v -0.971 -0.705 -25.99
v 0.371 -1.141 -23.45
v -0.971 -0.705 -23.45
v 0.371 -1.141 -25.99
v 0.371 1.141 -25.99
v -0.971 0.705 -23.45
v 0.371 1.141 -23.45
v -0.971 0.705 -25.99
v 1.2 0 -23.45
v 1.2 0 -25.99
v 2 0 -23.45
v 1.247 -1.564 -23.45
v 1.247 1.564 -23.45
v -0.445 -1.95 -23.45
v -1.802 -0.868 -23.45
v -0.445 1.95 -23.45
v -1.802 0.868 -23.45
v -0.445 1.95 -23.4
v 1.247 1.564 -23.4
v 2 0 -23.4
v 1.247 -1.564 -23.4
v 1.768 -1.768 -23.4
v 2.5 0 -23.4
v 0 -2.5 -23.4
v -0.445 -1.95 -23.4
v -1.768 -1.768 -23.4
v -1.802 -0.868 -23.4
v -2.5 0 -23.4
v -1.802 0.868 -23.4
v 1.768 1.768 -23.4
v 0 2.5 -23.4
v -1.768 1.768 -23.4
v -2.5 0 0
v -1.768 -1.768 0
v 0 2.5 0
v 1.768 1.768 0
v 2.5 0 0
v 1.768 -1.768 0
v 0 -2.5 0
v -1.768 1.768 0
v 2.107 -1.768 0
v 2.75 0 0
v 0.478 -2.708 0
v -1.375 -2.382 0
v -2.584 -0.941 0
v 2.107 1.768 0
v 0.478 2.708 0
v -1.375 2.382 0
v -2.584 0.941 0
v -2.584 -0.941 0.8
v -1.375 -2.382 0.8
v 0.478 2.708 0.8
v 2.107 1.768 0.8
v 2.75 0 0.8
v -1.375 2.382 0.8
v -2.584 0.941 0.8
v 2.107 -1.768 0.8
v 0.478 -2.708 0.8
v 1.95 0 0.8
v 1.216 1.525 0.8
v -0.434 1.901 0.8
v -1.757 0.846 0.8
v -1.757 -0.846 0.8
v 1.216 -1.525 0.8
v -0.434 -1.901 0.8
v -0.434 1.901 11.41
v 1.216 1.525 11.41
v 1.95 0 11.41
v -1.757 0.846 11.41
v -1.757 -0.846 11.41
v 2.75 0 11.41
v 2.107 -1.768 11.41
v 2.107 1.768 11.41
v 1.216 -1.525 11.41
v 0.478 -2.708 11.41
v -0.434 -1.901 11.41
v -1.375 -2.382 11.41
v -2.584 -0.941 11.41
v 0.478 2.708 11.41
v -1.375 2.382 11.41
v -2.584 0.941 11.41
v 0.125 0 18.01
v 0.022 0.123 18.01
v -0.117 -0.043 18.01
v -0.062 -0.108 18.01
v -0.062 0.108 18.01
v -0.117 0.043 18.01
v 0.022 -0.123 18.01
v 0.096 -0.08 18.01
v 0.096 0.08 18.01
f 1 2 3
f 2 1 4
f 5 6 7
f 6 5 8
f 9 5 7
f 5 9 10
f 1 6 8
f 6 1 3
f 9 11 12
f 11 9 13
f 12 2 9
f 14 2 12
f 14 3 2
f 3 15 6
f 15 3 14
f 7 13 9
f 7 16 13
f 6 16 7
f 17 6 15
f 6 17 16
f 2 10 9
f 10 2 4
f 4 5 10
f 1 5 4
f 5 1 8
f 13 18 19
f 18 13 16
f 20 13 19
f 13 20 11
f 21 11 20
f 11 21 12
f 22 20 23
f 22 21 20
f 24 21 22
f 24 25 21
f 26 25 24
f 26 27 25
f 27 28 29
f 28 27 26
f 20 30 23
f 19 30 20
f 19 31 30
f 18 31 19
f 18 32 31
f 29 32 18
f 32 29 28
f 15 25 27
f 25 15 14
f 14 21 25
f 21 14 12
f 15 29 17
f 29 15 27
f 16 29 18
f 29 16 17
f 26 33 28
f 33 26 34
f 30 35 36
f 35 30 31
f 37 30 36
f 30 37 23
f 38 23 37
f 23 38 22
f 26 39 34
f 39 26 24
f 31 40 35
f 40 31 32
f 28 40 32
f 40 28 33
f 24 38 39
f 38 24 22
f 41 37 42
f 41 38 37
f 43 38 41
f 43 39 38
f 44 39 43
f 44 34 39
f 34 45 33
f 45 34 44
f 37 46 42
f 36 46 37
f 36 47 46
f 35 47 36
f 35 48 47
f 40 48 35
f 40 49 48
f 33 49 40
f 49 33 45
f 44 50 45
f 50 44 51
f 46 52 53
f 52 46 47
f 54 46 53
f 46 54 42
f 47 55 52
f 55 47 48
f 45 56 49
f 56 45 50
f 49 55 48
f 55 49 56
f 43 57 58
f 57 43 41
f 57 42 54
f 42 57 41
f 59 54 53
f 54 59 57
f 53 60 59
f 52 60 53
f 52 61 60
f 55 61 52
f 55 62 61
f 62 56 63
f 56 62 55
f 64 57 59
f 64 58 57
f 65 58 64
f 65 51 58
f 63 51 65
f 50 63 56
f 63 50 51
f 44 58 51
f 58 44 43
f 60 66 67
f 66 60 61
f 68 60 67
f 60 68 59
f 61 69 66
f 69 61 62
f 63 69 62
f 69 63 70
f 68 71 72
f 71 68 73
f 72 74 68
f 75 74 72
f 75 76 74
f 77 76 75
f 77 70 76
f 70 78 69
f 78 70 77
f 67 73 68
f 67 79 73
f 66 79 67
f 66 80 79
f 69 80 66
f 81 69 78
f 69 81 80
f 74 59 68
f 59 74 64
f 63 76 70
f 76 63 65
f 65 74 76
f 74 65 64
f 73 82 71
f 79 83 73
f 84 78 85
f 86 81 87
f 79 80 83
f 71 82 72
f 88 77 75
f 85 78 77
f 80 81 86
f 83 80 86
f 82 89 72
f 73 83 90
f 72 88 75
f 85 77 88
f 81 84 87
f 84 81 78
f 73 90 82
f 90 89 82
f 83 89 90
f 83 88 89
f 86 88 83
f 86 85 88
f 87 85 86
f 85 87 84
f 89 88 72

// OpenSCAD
// file: GP-xL.scad
/* [Options] */
body_lip_diameter = 5.5;
body_diameter = 5;
lower_shaft_diameter = 2.4;
head_diameter = 5.5;
head_length = 6.6;
upper_shaft_diameter = 3.9;
total_length = 44;
body_lip_height = 0.8;
body_length = 23.4;
compression = 0;
retaining_disk_location_from_bottom = 2.54;
retaining_disk_height = 0.05;
retaining_disk_diameter = 4;
head_tip_diameter = 0.25;

module make_GP_xL(body_lip_diameter = body_lip_diameter,
body_diameter = body_diameter,
lower_shaft_diameter = lower_shaft_diameter,
head_diameter = head_diameter,
head_length = head_length,
upper_shaft_diameter = upper_shaft_diameter,
total_length = total_length,
body_lip_height = body_lip_height,
body_length = body_length,
compression = compression,
retaining_disk_location_from_bottom = retaining_disk_location_from_bottom,
retaining_disk_height = retaining_disk_height,
retaining_disk_diameter = retaining_disk_diameter,
head_tip_diameter = head_tip_diameter) {
    /*
    Bottom Shaft
    Retaining Ring
    Continuing Bottom Shaft
    Body
    Body Lip
    Upper Shaft
    Cone
    Compression
    */
    bottom_shaft_length = compression;
    upper_shaft_length = total_length-(retaining_disk_location_from_bottom+retaining_disk_height+bottom_shaft_length+body_length+body_lip_height+head_length);
    
    alignment_position = retaining_disk_location_from_bottom+retaining_disk_height+bottom_shaft_length+body_length;
    translate([0, 0, -alignment_position]) {
    translate([0,0,retaining_disk_location_from_bottom/2])cylinder(d=lower_shaft_diameter, h=retaining_disk_location_from_bottom, center=true);

    translate([0,0,retaining_disk_location_from_bottom])cylinder(d=retaining_disk_diameter, h=retaining_disk_height, center=false);

    translate([0,0,retaining_disk_location_from_bottom+retaining_disk_height])cylinder(d=lower_shaft_diameter, h=bottom_shaft_length);
    
    let(z=retaining_disk_location_from_bottom+retaining_disk_height+bottom_shaft_length) {
        translate([0,0,z])cylinder(d=body_diameter, h=body_length);
    };
    
    
    let(z=retaining_disk_location_from_bottom+retaining_disk_height+bottom_shaft_length+body_length) {
        translate([0,0,z])cylinder(d=body_lip_diameter, h=body_lip_height);
    };
    
    let(z=retaining_disk_location_from_bottom+retaining_disk_height+bottom_shaft_length+body_length+body_lip_height) {
        translate([0,0,z])cylinder(d=upper_shaft_diameter, h=upper_shaft_length);
    };
    
    let(z=retaining_disk_location_from_bottom+retaining_disk_height+bottom_shaft_length+body_length+body_lip_height+upper_shaft_length) {
        translate([0,0,z])cylinder(d1=head_diameter, d2=head_tip_diameter, h=head_length);
    };
};
}


make_GP_xL();
// main file
/* [Options] */
body_lip_diameter = 5.5;
body_diameter = 5;
lower_shaft_diameter = 2.4;
head_diameter = 5.5;
head_length = 6.6;
upper_shaft_diameter = 3.9;
total_length = 44;
body_lip_height = 0.8;
body_length = 23.4;
compression = 0;
retaining_disk_location_from_bottom = 2.54;
retaining_disk_height = 0.05;
retaining_disk_diameter = 4;
head_tip_diameter = 0.25;

use<GP-xL.scad>

module make_GP_2L(body_lip_diameter = body_lip_diameter,
body_diameter = body_diameter,
lower_shaft_diameter = lower_shaft_diameter,
head_diameter = head_diameter,
head_length = head_length,
upper_shaft_diameter = upper_shaft_diameter,
total_length = total_length,
body_lip_height = body_lip_height,
body_length = body_length,
compression = compression,
retaining_disk_location_from_bottom = retaining_disk_location_from_bottom,
retaining_disk_height = retaining_disk_height,
retaining_disk_diameter = retaining_disk_diameter,
head_tip_diameter = head_tip_diameter) {
    make_GP_xL(body_lip_diameter = body_lip_diameter,
body_diameter = body_diameter,
lower_shaft_diameter = lower_shaft_diameter,
head_diameter = head_diameter,
head_length = head_length,
upper_shaft_diameter = upper_shaft_diameter,
total_length = total_length,
body_lip_height = body_lip_height,
body_length = body_length,
compression = compression,
retaining_disk_location_from_bottom = retaining_disk_location_from_bottom,
retaining_disk_height = retaining_disk_height,
retaining_disk_diameter = retaining_disk_diameter,
head_tip_diameter = head_tip_diameter);
}

make_GP_2L(head_length=head_length, total_length=44, body_length=body_length);
